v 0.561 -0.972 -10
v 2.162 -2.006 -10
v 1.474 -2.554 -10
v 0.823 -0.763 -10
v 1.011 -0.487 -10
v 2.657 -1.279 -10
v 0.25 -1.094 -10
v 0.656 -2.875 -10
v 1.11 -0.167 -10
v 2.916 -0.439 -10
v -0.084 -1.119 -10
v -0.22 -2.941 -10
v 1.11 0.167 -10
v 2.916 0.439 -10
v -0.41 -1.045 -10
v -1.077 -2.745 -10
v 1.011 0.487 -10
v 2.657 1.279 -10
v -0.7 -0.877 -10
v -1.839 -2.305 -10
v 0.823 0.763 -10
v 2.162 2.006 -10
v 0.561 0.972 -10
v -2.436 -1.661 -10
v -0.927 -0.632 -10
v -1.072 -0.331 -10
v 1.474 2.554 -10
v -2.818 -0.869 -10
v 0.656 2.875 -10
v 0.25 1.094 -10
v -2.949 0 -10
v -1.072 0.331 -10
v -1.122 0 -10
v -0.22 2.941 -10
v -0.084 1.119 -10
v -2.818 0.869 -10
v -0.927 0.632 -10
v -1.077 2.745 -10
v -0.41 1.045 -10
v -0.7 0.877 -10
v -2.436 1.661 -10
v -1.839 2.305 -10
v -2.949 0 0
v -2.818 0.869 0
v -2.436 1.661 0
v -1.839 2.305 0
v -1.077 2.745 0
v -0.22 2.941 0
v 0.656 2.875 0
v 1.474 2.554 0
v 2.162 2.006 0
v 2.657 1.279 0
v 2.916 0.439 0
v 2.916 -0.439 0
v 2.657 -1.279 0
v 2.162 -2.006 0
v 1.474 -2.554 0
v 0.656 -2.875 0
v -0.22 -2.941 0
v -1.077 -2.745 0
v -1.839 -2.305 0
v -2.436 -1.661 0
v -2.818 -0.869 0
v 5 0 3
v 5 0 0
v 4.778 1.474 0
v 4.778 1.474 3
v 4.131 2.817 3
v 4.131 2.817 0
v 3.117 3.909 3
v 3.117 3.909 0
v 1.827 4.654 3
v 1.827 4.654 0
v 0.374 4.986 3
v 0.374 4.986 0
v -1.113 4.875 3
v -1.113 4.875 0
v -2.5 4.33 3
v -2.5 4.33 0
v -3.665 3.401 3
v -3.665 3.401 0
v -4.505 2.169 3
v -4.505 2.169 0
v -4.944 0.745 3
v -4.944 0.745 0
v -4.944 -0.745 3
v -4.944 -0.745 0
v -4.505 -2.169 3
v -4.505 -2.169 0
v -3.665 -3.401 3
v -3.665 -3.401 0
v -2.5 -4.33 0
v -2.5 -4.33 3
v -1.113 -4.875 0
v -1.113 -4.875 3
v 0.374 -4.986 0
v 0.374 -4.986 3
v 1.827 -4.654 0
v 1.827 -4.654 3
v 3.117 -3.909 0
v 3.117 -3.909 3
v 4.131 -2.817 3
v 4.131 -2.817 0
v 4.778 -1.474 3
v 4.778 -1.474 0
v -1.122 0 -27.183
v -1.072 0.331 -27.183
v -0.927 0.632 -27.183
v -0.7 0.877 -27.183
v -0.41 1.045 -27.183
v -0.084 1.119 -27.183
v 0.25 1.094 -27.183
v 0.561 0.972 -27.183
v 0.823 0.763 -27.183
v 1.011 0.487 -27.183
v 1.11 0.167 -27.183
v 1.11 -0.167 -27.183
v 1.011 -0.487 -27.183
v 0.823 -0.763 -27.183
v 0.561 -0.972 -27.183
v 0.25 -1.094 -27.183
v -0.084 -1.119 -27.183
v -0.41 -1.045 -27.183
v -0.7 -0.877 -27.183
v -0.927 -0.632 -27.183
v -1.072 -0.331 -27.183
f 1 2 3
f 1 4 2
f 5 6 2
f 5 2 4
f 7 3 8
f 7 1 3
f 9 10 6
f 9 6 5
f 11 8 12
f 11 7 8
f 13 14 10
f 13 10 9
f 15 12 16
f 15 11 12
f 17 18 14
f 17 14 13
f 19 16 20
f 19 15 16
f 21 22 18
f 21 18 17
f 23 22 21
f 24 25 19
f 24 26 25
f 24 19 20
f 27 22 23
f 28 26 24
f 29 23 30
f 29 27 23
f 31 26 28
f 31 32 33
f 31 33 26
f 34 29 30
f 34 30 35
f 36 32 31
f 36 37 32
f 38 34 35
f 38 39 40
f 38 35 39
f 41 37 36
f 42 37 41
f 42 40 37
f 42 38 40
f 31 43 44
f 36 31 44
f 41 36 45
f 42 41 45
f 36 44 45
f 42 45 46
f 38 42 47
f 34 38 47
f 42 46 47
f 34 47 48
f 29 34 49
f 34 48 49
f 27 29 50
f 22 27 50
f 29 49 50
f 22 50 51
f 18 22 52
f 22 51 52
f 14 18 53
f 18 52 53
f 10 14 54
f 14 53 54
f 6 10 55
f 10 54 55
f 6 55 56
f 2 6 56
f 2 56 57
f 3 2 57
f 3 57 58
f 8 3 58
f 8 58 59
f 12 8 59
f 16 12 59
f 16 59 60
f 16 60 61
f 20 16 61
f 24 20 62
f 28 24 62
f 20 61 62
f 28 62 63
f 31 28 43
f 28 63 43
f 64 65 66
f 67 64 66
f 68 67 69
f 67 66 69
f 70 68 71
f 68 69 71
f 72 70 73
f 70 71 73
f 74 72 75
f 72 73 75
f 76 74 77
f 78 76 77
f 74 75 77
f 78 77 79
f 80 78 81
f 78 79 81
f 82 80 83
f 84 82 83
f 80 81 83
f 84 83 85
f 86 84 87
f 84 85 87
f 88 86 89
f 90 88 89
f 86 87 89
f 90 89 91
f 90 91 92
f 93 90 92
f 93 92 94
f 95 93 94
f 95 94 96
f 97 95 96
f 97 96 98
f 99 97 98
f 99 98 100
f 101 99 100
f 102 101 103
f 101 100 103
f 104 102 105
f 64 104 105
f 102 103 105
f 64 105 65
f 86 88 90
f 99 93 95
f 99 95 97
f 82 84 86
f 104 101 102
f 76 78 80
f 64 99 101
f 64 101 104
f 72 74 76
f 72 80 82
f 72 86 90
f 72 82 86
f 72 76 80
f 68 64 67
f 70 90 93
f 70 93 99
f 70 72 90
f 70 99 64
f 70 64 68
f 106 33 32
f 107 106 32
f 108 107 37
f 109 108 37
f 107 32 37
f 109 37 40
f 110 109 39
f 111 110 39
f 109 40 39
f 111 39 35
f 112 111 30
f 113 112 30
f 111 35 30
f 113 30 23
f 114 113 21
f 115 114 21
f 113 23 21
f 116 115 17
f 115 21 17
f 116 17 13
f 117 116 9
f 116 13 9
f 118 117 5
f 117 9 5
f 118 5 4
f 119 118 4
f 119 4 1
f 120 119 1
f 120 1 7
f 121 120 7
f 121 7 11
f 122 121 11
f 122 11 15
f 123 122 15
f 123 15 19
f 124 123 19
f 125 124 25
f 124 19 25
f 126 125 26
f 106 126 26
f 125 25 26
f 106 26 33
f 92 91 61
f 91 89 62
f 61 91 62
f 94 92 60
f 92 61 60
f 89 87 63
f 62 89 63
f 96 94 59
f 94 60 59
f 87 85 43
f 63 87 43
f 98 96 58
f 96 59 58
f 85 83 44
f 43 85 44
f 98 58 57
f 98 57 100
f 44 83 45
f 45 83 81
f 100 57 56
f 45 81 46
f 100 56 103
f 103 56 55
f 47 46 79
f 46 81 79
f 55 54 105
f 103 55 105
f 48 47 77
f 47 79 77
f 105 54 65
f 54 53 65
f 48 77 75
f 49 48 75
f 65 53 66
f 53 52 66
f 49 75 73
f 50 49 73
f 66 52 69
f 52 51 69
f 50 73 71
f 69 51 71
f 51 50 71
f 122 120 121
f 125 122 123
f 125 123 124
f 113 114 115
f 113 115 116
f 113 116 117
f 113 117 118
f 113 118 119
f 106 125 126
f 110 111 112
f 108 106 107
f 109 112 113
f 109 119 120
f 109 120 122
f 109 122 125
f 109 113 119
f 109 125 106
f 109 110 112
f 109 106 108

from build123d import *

# Parameters (mm, degrees)
SKETCH_1_R      = 5
EXTRUDE_1_DEPTH = 3
SKETCH_2_R      = 2.948811386
EXTRUDE_2_DEPTH = 10
SKETCH_3_R      = 1.122261049
EXTRUDE_3_DEPTH = 17.182541617


with BuildPart() as part:
    # 草图1 → 凸台-拉伸1 (new body)
    with BuildSketch(Plane.XY):
        Circle(SKETCH_1_R)
    extrude(amount=EXTRUDE_1_DEPTH)

    # 草图2 → 凸台-拉伸2 (add)
    with BuildSketch(Plane(origin=(0, 0, 0), x_dir=(-1, 0, 0), z_dir=(0, 0, -1))):
        Circle(SKETCH_2_R)
    extrude(amount=EXTRUDE_2_DEPTH)

    # 草图3 → 凸台-拉伸3 (add)
    with BuildSketch(Plane(origin=(0, 0, -10), x_dir=(-1, 0, 0), z_dir=(0, 0, -1))):
        Circle(SKETCH_3_R)
    extrude(amount=EXTRUDE_3_DEPTH)


solid = part.part
